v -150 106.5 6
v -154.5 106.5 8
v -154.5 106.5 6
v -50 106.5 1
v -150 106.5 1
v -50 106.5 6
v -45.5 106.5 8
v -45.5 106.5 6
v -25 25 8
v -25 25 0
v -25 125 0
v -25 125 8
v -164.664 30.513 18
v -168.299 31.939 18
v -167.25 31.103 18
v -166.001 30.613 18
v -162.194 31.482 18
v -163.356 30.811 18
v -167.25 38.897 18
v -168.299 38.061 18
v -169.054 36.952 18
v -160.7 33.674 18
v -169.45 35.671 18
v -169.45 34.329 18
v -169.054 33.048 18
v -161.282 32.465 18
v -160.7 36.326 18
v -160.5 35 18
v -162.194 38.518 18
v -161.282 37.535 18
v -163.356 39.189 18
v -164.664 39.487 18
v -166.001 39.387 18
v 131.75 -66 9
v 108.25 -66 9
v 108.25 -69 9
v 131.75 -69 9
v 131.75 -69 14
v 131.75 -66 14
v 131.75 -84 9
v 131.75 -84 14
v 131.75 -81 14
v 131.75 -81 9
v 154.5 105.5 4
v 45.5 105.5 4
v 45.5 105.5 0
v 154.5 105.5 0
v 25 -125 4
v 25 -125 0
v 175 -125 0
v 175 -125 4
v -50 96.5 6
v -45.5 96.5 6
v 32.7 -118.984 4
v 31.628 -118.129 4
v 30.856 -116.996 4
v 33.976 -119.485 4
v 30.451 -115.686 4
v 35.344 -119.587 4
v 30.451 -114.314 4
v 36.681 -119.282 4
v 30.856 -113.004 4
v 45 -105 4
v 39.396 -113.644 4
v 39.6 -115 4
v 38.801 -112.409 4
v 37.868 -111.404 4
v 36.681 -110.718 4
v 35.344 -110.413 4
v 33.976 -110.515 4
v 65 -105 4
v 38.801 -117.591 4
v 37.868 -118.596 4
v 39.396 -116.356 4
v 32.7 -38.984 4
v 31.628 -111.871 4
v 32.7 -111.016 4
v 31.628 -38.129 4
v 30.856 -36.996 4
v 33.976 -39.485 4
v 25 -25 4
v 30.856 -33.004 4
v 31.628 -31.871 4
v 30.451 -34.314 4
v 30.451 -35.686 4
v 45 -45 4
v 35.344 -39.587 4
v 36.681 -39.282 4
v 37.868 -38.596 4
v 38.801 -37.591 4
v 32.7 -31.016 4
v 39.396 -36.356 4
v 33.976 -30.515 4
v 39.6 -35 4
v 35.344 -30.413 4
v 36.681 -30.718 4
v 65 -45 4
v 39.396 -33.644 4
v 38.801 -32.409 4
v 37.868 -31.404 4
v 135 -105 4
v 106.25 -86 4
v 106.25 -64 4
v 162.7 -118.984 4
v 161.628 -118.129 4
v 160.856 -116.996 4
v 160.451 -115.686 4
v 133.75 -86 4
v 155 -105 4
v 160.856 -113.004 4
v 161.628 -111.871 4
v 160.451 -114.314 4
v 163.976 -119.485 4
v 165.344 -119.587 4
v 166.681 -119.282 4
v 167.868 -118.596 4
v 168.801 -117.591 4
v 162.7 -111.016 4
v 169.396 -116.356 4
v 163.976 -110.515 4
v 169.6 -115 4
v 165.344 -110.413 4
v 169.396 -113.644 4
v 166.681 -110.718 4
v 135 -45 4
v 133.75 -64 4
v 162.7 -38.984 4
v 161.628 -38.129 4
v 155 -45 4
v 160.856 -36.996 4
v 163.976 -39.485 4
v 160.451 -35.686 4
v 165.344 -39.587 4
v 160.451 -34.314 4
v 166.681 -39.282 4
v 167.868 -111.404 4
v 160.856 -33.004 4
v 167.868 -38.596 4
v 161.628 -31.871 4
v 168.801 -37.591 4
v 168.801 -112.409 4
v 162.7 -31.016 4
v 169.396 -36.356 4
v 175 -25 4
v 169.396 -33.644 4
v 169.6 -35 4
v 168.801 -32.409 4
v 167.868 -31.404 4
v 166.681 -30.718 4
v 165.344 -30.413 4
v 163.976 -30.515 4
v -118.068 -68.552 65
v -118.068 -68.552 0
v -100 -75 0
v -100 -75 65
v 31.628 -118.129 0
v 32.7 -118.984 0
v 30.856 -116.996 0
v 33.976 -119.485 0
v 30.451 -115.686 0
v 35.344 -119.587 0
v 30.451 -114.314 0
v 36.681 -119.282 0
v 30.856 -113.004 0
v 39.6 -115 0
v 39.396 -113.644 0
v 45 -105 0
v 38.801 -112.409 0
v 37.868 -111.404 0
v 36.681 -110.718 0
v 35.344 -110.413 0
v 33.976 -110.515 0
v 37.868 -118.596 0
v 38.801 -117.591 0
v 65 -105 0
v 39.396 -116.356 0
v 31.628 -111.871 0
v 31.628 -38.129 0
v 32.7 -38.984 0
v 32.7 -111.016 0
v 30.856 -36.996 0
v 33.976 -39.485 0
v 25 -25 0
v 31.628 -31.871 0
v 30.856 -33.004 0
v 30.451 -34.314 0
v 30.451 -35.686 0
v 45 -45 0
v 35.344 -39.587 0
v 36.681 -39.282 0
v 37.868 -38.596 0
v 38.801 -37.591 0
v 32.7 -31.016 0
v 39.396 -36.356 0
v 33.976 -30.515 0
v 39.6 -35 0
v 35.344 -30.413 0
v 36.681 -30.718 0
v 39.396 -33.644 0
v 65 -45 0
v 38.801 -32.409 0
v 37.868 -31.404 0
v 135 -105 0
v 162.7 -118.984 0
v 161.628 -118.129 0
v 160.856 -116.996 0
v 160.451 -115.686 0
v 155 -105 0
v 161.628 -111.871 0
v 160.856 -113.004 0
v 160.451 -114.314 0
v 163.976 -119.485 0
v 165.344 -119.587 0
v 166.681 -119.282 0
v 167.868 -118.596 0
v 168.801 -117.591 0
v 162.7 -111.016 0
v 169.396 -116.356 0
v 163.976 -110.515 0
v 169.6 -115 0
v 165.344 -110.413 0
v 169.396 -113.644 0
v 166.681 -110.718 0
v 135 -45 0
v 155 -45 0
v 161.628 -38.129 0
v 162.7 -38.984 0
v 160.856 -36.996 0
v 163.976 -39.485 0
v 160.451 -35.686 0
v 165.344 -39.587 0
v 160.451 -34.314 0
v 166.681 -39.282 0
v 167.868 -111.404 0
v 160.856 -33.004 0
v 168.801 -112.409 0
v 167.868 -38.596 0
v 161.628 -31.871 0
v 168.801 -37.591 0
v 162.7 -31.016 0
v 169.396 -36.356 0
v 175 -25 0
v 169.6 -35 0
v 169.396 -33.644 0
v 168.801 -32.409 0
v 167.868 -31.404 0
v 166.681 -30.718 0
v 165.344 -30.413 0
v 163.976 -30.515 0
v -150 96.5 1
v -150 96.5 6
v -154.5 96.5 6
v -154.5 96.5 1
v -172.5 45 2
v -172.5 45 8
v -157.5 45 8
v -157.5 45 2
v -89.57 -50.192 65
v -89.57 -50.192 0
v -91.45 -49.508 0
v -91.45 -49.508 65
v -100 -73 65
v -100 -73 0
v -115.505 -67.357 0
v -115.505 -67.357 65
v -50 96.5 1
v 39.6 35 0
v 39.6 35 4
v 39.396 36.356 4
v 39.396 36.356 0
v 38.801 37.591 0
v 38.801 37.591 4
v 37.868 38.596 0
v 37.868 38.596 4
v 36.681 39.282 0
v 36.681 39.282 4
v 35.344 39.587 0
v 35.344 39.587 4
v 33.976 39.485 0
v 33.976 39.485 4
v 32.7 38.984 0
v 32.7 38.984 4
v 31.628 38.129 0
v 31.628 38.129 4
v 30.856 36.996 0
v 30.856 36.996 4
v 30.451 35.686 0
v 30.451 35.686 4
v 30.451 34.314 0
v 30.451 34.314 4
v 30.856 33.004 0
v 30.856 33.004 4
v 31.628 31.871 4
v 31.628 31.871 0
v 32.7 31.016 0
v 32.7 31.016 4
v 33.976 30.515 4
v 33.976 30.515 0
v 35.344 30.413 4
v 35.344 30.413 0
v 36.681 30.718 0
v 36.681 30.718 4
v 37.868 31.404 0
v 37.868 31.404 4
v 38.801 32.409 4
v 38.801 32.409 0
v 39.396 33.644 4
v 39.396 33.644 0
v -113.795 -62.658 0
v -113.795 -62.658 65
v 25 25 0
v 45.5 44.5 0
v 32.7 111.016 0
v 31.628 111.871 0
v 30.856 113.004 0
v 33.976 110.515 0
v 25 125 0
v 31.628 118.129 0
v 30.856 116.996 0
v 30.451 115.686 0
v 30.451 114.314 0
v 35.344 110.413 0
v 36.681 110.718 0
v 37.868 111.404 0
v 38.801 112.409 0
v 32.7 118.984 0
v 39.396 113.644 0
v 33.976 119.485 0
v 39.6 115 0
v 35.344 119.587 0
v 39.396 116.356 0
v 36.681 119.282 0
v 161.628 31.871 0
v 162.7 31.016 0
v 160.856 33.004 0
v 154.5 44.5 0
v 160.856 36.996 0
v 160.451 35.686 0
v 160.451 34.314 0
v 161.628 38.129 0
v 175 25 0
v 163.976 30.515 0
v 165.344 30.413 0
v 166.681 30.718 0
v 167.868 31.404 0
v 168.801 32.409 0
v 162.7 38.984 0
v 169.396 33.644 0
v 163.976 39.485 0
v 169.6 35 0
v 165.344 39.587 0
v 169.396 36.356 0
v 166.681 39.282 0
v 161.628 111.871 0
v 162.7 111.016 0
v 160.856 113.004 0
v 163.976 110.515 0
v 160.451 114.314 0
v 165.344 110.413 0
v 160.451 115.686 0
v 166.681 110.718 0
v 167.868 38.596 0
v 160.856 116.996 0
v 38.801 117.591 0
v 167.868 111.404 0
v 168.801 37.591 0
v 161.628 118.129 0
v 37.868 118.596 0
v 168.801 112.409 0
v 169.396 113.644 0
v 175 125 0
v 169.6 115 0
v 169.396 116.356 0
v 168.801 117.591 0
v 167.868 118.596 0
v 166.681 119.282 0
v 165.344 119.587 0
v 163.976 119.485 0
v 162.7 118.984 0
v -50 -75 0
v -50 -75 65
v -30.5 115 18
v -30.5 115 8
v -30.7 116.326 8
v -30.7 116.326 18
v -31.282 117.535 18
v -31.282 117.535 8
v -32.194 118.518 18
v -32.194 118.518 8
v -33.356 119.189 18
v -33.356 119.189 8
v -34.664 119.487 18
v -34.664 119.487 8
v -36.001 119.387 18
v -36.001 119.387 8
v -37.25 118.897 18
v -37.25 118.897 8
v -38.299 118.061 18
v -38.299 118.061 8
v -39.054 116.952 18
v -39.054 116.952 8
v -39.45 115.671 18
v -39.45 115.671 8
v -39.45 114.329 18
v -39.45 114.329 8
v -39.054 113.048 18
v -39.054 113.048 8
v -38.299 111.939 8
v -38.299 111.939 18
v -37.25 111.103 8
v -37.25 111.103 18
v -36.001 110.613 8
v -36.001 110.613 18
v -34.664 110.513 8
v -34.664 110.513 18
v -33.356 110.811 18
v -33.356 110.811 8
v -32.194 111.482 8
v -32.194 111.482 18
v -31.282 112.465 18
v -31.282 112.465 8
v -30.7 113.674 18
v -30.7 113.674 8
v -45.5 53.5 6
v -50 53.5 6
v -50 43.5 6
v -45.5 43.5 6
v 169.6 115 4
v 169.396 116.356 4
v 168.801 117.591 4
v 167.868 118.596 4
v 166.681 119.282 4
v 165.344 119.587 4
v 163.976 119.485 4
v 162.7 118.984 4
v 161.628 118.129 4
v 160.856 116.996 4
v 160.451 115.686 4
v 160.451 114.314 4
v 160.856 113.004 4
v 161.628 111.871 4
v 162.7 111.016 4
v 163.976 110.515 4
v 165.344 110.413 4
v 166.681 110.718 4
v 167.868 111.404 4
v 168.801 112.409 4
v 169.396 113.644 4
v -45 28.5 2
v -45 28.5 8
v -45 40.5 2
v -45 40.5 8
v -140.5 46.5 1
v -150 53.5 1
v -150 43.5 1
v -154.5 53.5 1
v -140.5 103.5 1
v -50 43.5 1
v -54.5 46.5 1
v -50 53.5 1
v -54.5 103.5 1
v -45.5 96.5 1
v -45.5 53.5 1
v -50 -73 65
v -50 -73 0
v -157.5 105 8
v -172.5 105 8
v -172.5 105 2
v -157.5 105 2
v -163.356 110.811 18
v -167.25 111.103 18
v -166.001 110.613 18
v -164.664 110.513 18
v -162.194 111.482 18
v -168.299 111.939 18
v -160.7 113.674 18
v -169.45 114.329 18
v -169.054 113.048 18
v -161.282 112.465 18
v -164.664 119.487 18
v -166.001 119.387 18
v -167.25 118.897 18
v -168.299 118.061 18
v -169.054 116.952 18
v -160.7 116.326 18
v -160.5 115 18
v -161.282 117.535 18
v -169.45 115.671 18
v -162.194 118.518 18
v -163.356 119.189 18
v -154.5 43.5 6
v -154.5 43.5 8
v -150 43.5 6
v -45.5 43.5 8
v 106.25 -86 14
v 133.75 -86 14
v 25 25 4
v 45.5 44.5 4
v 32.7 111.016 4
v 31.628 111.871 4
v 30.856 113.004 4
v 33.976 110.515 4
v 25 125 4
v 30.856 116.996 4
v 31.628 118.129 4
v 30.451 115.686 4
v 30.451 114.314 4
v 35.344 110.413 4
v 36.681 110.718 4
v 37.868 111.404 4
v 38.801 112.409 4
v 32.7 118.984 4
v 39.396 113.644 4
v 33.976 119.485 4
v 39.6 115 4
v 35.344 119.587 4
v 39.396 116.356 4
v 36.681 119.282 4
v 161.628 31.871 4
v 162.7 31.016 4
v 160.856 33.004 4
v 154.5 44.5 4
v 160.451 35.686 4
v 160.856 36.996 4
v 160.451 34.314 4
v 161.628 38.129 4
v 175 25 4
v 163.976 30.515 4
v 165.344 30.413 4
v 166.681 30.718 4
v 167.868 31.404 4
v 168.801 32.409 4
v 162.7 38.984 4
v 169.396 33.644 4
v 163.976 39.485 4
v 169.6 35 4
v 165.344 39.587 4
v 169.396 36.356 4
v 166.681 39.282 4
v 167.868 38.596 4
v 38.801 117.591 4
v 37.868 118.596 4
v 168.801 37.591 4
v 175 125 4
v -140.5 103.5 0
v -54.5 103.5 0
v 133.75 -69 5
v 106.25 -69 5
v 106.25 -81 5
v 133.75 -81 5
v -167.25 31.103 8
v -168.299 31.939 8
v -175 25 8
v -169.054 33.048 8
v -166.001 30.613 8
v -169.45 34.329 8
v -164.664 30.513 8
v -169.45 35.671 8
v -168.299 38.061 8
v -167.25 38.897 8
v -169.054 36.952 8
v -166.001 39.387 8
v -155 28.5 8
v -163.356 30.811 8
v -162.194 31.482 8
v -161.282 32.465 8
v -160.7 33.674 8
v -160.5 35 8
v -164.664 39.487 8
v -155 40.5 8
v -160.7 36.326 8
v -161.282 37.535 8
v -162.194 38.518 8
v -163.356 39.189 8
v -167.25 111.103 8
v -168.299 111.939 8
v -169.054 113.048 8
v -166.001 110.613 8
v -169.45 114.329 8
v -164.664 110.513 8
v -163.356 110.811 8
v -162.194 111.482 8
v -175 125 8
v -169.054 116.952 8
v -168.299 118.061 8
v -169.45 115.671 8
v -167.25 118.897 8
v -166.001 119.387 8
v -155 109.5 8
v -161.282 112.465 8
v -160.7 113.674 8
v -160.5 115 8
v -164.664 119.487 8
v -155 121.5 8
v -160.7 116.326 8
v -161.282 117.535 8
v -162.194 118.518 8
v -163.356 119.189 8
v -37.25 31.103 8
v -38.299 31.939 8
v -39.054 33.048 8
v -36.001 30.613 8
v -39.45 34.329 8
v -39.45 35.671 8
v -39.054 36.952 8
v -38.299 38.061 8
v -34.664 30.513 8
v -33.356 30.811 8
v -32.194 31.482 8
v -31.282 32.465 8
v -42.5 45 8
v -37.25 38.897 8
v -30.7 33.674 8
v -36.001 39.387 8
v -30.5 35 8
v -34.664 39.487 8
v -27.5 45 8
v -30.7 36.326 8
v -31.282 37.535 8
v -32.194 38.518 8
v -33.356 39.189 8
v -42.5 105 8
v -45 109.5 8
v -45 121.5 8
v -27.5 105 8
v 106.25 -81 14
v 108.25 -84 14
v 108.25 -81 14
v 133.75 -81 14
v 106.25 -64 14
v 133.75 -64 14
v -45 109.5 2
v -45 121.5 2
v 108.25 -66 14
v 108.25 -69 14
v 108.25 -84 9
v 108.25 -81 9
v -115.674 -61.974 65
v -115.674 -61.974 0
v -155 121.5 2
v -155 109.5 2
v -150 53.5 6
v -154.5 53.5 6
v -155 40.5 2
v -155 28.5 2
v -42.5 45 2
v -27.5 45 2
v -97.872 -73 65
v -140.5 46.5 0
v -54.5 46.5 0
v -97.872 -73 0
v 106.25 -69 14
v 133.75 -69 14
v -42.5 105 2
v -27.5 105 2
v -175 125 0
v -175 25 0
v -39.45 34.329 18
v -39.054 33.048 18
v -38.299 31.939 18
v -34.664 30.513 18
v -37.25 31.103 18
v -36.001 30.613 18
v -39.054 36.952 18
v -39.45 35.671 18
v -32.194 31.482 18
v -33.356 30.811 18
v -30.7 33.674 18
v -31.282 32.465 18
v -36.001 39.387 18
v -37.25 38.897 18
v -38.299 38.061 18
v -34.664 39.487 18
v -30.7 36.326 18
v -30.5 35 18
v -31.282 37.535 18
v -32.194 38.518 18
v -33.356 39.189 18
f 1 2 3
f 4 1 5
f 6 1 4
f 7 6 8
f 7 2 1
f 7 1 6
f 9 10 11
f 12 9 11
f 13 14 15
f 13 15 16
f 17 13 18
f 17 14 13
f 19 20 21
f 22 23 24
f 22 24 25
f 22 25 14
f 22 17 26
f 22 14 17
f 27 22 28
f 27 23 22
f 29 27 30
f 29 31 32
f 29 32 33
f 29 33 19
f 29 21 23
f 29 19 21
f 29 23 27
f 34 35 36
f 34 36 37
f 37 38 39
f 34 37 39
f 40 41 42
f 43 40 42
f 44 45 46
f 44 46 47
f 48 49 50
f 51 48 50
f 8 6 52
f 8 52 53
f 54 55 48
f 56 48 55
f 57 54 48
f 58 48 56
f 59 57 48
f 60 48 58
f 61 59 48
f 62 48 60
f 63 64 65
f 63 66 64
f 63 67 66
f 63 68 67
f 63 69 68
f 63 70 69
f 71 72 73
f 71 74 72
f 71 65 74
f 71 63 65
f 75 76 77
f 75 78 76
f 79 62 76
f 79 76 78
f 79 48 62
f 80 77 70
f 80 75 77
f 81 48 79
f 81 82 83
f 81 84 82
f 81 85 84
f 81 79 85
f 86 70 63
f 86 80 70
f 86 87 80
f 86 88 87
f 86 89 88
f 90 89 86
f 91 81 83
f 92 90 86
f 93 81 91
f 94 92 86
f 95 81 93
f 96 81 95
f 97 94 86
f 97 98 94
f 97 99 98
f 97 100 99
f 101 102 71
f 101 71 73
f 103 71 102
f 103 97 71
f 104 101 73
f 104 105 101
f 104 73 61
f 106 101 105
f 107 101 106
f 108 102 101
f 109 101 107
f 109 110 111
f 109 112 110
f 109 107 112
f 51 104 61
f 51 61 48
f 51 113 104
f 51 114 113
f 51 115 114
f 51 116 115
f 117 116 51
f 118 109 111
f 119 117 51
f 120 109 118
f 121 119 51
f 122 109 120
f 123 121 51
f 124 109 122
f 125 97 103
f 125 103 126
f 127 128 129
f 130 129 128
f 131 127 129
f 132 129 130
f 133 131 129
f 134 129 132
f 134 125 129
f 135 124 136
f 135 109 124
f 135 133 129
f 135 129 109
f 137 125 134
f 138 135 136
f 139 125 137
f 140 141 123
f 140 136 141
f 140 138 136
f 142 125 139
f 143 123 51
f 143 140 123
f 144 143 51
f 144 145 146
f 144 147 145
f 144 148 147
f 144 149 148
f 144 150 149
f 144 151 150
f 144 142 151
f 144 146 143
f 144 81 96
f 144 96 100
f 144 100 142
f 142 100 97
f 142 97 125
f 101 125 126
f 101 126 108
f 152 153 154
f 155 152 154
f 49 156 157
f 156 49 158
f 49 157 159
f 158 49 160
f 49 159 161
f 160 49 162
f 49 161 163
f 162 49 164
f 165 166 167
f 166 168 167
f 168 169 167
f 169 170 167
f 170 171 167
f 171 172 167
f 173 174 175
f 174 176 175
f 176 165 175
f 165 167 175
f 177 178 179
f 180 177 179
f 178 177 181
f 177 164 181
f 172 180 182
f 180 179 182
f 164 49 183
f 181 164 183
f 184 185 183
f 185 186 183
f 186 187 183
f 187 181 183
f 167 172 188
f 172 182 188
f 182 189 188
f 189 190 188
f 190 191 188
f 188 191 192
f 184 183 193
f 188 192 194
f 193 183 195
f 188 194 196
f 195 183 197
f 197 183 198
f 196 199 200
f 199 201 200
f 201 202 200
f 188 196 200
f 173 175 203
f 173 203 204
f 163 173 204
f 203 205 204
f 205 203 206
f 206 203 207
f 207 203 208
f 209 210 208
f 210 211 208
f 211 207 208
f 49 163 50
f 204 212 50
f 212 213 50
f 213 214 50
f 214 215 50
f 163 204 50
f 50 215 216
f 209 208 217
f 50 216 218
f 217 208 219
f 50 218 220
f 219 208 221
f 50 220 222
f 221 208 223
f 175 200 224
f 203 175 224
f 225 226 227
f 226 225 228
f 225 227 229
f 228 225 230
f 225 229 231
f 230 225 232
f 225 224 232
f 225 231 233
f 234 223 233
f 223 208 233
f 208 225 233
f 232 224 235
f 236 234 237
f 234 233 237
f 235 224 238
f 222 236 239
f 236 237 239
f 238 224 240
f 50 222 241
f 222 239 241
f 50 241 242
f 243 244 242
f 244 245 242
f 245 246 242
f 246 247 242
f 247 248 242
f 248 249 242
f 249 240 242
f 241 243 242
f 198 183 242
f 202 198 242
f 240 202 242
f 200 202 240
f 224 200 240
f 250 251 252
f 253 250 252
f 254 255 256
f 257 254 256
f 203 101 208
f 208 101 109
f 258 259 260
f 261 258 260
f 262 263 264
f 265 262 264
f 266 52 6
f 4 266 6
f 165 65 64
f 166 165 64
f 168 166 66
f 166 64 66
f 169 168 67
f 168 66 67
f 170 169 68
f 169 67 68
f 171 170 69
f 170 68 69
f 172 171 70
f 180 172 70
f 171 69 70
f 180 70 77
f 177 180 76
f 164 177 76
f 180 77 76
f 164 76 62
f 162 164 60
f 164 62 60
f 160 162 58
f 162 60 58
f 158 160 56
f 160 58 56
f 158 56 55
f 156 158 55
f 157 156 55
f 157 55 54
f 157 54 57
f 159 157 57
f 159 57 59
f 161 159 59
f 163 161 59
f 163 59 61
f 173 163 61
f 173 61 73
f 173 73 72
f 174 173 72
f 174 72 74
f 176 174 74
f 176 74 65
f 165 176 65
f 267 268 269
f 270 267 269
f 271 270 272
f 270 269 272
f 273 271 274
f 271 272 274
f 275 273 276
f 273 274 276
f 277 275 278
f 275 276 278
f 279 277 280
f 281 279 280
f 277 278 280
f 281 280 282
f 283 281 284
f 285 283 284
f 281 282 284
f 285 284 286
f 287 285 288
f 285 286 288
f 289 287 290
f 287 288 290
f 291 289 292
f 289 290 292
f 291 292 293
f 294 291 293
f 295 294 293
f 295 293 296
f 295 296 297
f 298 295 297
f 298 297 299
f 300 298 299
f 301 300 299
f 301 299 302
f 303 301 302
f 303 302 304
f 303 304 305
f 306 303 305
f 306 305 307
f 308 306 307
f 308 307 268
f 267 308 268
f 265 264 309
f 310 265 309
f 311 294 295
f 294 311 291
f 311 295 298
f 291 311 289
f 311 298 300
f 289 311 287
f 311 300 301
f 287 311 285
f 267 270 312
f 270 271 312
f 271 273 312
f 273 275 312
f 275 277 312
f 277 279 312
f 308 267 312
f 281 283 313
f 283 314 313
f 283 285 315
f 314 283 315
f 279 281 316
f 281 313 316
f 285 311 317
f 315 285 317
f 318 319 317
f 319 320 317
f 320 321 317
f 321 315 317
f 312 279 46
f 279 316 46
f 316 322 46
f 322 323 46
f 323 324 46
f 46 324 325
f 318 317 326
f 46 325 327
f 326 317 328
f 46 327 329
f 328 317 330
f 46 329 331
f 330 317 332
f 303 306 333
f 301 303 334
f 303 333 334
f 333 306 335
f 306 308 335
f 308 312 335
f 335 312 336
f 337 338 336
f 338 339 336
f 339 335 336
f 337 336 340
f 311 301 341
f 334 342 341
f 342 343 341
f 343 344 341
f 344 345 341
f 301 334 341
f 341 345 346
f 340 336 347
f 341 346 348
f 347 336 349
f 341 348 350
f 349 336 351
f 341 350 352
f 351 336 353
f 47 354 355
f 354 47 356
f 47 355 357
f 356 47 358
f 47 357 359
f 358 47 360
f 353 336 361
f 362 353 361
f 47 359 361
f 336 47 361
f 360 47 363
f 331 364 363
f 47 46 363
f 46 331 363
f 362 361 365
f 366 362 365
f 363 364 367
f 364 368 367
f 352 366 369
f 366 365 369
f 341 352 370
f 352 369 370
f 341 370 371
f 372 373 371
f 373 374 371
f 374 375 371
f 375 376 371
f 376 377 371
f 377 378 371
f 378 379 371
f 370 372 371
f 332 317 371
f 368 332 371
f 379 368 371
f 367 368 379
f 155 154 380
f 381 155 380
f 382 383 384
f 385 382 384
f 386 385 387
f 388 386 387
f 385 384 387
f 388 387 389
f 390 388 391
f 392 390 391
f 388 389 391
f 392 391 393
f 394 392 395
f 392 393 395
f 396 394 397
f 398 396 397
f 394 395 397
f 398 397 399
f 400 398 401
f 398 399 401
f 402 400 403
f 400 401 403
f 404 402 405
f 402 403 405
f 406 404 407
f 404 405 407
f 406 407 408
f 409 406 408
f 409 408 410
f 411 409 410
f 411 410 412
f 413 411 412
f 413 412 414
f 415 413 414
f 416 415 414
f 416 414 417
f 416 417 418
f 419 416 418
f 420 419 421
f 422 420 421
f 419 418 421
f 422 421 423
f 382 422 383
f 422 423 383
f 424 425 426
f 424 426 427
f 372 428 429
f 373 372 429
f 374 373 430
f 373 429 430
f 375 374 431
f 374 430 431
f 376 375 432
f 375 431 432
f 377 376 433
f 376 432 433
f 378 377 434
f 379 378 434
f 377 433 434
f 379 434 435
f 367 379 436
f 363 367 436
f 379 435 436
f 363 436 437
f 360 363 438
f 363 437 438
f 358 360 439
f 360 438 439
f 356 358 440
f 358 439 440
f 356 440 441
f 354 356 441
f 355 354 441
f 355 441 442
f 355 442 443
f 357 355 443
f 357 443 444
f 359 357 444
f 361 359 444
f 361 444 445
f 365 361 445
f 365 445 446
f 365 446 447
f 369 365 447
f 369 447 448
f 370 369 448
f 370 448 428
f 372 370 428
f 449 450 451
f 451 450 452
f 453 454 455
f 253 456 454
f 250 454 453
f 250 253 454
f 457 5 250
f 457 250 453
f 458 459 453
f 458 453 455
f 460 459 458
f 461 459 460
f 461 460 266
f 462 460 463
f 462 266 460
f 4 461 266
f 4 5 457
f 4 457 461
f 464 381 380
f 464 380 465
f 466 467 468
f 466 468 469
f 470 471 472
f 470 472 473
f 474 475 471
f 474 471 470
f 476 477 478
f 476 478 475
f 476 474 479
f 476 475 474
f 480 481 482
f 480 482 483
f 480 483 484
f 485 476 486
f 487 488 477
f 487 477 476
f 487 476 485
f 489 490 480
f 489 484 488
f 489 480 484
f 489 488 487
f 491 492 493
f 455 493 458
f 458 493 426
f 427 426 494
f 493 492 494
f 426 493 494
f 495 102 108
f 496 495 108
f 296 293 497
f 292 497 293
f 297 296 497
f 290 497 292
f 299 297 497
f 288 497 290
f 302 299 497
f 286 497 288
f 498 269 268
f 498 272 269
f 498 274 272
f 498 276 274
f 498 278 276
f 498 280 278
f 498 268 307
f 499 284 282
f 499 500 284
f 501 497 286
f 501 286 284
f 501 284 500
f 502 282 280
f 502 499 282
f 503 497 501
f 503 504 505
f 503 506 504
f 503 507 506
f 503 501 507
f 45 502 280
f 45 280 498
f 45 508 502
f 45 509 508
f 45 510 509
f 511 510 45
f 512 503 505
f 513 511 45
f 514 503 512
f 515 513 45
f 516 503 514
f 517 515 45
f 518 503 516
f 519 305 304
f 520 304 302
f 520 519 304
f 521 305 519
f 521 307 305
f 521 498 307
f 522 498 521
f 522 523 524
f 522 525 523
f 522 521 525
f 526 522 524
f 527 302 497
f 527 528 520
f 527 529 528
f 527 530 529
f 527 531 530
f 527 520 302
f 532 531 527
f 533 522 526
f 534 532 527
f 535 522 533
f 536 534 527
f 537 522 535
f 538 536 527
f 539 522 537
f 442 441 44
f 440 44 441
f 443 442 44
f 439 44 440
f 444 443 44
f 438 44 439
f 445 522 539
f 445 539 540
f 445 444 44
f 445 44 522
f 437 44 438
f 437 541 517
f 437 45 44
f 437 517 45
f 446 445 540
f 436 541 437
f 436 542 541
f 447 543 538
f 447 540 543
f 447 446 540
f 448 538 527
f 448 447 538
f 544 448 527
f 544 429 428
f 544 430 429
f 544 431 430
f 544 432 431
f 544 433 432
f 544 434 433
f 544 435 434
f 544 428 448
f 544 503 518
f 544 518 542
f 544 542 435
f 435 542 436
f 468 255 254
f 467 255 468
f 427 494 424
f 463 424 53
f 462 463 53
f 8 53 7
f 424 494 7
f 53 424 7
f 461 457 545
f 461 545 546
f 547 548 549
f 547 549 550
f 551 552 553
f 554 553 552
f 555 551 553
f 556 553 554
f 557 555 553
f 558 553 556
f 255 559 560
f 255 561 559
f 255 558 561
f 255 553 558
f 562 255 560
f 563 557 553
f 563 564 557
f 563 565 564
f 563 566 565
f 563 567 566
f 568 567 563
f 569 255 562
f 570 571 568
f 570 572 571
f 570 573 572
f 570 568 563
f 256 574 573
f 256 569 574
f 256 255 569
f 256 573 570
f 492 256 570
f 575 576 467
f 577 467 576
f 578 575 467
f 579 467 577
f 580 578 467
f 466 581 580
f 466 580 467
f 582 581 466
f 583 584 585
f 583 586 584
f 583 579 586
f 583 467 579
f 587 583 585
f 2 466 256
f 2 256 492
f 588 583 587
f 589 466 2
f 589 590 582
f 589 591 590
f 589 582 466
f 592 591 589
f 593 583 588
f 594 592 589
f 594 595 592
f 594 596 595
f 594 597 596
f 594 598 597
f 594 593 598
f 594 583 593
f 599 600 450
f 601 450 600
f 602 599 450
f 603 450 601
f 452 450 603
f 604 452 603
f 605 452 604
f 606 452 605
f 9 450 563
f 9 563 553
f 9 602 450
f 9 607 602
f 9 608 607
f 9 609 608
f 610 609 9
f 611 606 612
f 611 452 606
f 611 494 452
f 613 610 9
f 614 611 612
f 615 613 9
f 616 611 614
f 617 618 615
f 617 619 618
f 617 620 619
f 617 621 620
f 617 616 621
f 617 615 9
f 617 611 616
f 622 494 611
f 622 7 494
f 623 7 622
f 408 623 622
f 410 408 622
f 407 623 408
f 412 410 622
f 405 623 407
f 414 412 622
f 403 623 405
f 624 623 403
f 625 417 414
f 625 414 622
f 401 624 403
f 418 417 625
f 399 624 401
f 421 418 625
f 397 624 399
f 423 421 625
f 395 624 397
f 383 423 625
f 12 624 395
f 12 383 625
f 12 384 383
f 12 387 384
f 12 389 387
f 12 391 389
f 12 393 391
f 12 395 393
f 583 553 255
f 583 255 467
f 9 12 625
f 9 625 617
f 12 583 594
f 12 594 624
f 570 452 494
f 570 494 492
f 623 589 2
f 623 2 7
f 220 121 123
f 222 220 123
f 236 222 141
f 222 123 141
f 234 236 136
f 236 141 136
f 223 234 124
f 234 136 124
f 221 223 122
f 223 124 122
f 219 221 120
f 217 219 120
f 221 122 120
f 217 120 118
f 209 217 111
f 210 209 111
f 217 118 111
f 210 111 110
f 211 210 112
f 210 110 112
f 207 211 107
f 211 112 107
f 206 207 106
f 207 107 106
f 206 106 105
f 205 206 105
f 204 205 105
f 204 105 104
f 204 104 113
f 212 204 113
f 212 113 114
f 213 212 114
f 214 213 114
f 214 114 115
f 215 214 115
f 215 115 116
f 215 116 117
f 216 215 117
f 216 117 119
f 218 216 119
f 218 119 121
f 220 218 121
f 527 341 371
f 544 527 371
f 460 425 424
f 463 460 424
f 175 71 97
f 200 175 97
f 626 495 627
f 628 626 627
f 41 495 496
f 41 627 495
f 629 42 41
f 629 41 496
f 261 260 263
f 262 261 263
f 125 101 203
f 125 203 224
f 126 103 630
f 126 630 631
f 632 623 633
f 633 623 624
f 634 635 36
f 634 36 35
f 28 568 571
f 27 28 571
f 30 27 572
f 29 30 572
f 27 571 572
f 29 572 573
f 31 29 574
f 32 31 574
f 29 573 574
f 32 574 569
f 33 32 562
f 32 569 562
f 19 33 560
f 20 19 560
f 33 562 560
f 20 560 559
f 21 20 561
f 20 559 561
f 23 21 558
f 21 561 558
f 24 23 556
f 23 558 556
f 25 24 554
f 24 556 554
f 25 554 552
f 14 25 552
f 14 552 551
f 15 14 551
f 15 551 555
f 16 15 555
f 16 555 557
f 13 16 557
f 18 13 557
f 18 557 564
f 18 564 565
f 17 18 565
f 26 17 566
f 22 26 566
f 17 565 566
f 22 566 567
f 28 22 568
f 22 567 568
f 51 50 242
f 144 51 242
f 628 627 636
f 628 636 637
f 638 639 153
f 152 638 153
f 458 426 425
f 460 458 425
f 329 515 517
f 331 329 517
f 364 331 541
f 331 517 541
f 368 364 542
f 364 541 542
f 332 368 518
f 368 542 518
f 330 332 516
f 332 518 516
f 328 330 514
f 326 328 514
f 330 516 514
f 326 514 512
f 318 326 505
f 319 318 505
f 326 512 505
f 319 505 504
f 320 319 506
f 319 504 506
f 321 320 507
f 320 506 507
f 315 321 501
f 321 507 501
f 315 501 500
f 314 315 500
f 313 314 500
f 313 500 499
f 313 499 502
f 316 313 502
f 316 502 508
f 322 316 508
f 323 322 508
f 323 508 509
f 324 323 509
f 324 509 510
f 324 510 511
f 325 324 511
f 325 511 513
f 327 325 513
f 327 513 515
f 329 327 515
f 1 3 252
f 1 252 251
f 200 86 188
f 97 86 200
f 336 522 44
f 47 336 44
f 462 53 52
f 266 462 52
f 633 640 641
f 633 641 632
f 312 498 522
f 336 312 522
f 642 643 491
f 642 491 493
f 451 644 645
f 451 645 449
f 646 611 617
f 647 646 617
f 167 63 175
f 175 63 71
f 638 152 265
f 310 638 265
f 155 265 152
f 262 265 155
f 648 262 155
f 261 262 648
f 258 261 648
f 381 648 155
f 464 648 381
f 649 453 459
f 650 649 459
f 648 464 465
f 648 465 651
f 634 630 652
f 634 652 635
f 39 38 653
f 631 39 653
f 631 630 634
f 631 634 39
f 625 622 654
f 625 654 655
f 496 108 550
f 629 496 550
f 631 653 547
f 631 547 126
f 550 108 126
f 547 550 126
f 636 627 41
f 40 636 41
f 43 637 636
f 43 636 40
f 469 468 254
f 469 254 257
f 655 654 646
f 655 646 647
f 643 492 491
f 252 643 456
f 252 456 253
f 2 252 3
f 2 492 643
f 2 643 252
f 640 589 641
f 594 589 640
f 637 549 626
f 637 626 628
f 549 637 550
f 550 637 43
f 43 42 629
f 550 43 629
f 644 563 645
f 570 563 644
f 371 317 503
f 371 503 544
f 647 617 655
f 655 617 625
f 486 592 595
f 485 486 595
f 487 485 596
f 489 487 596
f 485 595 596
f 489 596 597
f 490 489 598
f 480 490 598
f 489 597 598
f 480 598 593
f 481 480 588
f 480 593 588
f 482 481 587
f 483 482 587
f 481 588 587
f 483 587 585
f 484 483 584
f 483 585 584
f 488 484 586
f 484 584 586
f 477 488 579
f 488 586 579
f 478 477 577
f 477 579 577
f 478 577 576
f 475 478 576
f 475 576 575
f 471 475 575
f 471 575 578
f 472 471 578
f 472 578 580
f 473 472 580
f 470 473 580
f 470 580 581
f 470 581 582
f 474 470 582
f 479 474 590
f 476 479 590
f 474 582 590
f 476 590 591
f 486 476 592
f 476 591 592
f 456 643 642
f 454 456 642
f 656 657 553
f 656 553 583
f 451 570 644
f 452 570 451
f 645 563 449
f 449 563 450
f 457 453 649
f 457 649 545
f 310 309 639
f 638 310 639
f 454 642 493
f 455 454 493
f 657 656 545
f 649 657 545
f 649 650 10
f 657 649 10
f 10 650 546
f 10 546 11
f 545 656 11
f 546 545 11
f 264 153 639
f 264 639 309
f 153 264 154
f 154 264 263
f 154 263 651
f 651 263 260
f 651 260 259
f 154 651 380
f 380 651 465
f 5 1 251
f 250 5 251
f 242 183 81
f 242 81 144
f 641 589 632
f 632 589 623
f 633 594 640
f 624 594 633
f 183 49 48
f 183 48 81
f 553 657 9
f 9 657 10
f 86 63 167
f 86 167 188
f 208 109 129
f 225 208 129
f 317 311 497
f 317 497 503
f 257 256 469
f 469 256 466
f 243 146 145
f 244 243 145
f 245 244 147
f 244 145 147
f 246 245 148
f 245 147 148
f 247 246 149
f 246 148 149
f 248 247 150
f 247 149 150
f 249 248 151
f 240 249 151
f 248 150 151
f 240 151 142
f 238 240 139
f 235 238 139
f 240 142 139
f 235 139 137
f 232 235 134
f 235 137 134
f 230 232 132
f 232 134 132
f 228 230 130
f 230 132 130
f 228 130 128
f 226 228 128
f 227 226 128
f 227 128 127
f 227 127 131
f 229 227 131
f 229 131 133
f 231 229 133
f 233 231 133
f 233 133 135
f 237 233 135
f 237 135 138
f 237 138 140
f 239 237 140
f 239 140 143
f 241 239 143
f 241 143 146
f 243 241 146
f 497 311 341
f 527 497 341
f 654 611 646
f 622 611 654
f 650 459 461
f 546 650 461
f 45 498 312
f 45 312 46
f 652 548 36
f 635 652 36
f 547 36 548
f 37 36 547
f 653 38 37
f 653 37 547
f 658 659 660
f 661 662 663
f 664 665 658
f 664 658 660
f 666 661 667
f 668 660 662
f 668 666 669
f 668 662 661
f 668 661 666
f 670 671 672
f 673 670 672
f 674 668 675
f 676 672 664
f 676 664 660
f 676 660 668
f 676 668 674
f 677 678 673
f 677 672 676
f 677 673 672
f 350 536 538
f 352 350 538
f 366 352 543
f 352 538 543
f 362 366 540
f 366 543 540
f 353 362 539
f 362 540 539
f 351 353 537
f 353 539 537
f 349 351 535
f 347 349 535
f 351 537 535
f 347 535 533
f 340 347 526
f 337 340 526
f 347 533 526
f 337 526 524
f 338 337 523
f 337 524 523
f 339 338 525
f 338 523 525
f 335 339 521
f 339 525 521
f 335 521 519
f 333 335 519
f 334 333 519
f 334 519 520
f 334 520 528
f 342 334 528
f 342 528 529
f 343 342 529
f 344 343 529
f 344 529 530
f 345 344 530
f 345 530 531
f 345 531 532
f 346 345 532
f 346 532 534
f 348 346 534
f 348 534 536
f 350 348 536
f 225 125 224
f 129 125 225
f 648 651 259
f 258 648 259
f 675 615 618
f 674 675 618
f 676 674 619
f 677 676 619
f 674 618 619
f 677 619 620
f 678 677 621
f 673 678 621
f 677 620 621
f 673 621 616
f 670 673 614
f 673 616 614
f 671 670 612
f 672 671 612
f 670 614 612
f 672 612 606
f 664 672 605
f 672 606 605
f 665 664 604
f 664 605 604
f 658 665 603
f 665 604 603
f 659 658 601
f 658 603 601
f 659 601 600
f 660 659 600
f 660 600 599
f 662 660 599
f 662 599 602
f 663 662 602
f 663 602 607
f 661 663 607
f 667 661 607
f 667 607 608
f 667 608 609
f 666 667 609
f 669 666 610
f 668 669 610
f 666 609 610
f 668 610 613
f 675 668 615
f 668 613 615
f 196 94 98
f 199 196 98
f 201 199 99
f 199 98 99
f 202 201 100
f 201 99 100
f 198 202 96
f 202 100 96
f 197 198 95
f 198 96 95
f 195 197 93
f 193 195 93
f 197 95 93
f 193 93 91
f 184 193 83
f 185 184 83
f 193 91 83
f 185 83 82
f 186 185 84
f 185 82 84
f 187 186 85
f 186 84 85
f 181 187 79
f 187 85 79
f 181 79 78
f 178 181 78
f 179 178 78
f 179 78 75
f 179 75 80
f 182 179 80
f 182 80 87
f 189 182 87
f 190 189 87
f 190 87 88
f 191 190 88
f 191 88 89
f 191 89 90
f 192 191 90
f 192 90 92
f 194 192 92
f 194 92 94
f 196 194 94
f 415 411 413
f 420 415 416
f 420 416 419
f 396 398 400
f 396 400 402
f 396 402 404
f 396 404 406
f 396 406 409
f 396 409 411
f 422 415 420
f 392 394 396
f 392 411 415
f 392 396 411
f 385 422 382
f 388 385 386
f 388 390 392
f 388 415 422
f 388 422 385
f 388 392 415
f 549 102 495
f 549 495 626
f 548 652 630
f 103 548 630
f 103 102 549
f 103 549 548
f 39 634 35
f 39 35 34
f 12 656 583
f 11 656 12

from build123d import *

# Parameters (mm, degrees)
SKETCH_W        = 150
SKETCH_H        = 100
PAD_DEPTH       = 8
SKETCH001_W     = 109
SKETCH001_H     = 63
POCKET_DEPTH    = 2
POCKET001_DEPTH = 5
SKETCH003_W     = 86
SKETCH003_H     = 57
POCKET002_DEPTH = 1
SKETCH004_R     = 4.5
PAD001_DEPTH    = 10
SKETCH005_W     = 110
SKETCH005_H     = 12
SKETCH005_W_2   = 15
SKETCH005_H_2   = 60
POCKET003_DEPTH = 6
SKETCH006_W     = 150
SKETCH006_H     = 100
PAD002_DEPTH    = 4
SKETCH010_R     = 4.6
SKETCH010_W     = 109
SKETCH010_H     = 61
POCKET004_DEPTH = 4.001
SKETCH011_W     = 150
SKETCH011_H     = 100
PAD003_DEPTH    = 4
SKETCH012_R     = 4.6
SKETCH012_W     = 20
SKETCH012_H     = 60
POCKET005_DEPTH = 4.001
SKETCH013_W     = 27.5
SKETCH013_H     = 22
PAD004_DEPTH    = 10
SKETCH014_W     = 23.5
SKETCH014_H     = 18
POCKET006_DEPTH = 5
SKETCH015_W     = 27.5
SKETCH015_H     = 12
POCKET007_DEPTH = 9
PAD005_DEPTH    = 65


with BuildPart() as front:
    # Sketch → Pad (new body)
    with BuildSketch(Plane.XY):
        with Locations((-100, 75)):
            Rectangle(SKETCH_W, SKETCH_H)
    extrude(amount=PAD_DEPTH)

    # Sketch001 (on Face6 of Pad) → Pocket (cut)
    with BuildSketch(Plane.XY.offset(8)):
        with Locations((-100, 75)):
            Rectangle(SKETCH001_W, SKETCH001_H)
    extrude(amount=-POCKET_DEPTH, mode=Mode.SUBTRACT)

    # Sketch002 (on Face11 of Pocket) → Pocket001 (cut)
    with BuildSketch(Plane.XY.offset(6)):
        Polygon((-150, 43.5), (-50, 43.5), (-50, 53.5), (-45.5, 53.5), (-45.5, 96.5), (-50, 96.5), (-50, 106.5), (-150, 106.5), (-150, 96.5), (-154.5, 96.5), (-154.5, 53.5), (-150, 53.5), align=None)
    extrude(amount=-POCKET001_DEPTH, mode=Mode.SUBTRACT)

    # Sketch003 (on Face22 of Pocket001) → Pocket002 (cut)
    with BuildSketch(Plane.XY.offset(1)):
        with Locations((-97.5, 75)):
            Rectangle(SKETCH003_W, SKETCH003_H)
    extrude(amount=-POCKET002_DEPTH, mode=Mode.SUBTRACT)

    # Sketch004 (on Face5 of Pocket002) → Pad001 (join)
    with BuildSketch(Plane.XY.offset(8)):
        with Locations((-165, 115)):
            Circle(SKETCH004_R)
        with Locations((-35, 115)):
            Circle(SKETCH004_R)
        with Locations((-35, 35)):
            Circle(SKETCH004_R)
        with Locations((-165, 35)):
            Circle(SKETCH004_R)
    extrude(amount=PAD001_DEPTH)

    # Sketch005 (on Face5 of Pad001) → Pocket003 (cut)
    with BuildSketch(Plane.XY.offset(8)):
        with Locations((-100, 115.5)):
            Rectangle(SKETCH005_W, SKETCH005_H)
        with Locations((-35, 75)):
            Rectangle(SKETCH005_W_2, SKETCH005_H_2)
        with Locations((-100, 34.5)):
            Rectangle(SKETCH005_W, SKETCH005_H)
        with Locations((-165, 75)):
            Rectangle(SKETCH005_W_2, SKETCH005_H_2)
    extrude(amount=-POCKET003_DEPTH, mode=Mode.SUBTRACT)


with BuildPart() as spacer:
    # Sketch006 → Pad002 (new body)
    with BuildSketch(Plane.XY):
        with Locations((100, 75)):
            Rectangle(SKETCH006_W, SKETCH006_H)
    extrude(amount=PAD002_DEPTH)

    # Sketch010 (on Face6 of Pad002) → Pocket004 (cut, through all)
    with BuildSketch(Plane.XY.offset(4)):
        with Locations((35, 115)):
            Circle(SKETCH010_R)
        with Locations((165, 115)):
            Circle(SKETCH010_R)
        with Locations((165, 35)):
            Circle(SKETCH010_R)
        with Locations((35, 35)):
            Circle(SKETCH010_R)
        with Locations((100, 75)):
            Rectangle(SKETCH010_W, SKETCH010_H)
    extrude(amount=-POCKET004_DEPTH, mode=Mode.SUBTRACT)


with BuildPart() as back:
    # Sketch011 → Pad003 (new body)
    with BuildSketch(Plane.XY):
        with Locations((100, -75)):
            Rectangle(SKETCH011_W, SKETCH011_H)
    extrude(amount=PAD003_DEPTH)

    # Sketch012 (on Face6 of Pad003) → Pocket005 (cut, through all)
    with BuildSketch(Plane.XY.offset(4)):
        with Locations((35, -35)):
            Circle(SKETCH012_R)
        with Locations((165, -35)):
            Circle(SKETCH012_R)
        with Locations((165, -115)):
            Circle(SKETCH012_R)
        with Locations((35, -115)):
            Circle(SKETCH012_R)
        with Locations((55, -75)):
            Rectangle(SKETCH012_W, SKETCH012_H)
        with Locations((145, -75)):
            Rectangle(SKETCH012_W, SKETCH012_H)
    extrude(amount=-POCKET005_DEPTH, mode=Mode.SUBTRACT)

    # Sketch013 (on Face6 of Pad003) → Pad004 (join)
    with BuildSketch(Plane.XY.offset(4)):
        with Locations((120, -75)):
            Rectangle(SKETCH013_W, SKETCH013_H)
    extrude(amount=PAD004_DEPTH)

    # Sketch014 (on Face23 of Pad004) → Pocket006 (cut)
    with BuildSketch(Plane.XY.offset(14)):
        with Locations((120, -75)):
            Rectangle(SKETCH014_W, SKETCH014_H)
    extrude(amount=-POCKET006_DEPTH, mode=Mode.SUBTRACT)

    # Sketch015 (on Face23 of Pocket006) → Pocket007 (cut)
    with BuildSketch(Plane.XY.offset(14)):
        with Locations((120, -75)):
            Rectangle(SKETCH015_W, SKETCH015_H)
    extrude(amount=-POCKET007_DEPTH, mode=Mode.SUBTRACT)


with BuildPart() as stand:
    # Sketch017 → Pad005 (new body)
    with BuildSketch(Plane.XY):
        Polygon((-100, -75), (-50, -75), (-50, -73), (-97.871657, -73), (-89.570124, -50.191725), (-91.449509, -49.507684), (-100.000013, -73), (-115.504941, -67.356668), (-113.79484, -62.658205), (-115.674225, -61.974164), (-118.068366, -68.552013), align=None)
    extrude(amount=PAD005_DEPTH)


solid = Compound([front.part, spacer.part, back.part, stand.part])
